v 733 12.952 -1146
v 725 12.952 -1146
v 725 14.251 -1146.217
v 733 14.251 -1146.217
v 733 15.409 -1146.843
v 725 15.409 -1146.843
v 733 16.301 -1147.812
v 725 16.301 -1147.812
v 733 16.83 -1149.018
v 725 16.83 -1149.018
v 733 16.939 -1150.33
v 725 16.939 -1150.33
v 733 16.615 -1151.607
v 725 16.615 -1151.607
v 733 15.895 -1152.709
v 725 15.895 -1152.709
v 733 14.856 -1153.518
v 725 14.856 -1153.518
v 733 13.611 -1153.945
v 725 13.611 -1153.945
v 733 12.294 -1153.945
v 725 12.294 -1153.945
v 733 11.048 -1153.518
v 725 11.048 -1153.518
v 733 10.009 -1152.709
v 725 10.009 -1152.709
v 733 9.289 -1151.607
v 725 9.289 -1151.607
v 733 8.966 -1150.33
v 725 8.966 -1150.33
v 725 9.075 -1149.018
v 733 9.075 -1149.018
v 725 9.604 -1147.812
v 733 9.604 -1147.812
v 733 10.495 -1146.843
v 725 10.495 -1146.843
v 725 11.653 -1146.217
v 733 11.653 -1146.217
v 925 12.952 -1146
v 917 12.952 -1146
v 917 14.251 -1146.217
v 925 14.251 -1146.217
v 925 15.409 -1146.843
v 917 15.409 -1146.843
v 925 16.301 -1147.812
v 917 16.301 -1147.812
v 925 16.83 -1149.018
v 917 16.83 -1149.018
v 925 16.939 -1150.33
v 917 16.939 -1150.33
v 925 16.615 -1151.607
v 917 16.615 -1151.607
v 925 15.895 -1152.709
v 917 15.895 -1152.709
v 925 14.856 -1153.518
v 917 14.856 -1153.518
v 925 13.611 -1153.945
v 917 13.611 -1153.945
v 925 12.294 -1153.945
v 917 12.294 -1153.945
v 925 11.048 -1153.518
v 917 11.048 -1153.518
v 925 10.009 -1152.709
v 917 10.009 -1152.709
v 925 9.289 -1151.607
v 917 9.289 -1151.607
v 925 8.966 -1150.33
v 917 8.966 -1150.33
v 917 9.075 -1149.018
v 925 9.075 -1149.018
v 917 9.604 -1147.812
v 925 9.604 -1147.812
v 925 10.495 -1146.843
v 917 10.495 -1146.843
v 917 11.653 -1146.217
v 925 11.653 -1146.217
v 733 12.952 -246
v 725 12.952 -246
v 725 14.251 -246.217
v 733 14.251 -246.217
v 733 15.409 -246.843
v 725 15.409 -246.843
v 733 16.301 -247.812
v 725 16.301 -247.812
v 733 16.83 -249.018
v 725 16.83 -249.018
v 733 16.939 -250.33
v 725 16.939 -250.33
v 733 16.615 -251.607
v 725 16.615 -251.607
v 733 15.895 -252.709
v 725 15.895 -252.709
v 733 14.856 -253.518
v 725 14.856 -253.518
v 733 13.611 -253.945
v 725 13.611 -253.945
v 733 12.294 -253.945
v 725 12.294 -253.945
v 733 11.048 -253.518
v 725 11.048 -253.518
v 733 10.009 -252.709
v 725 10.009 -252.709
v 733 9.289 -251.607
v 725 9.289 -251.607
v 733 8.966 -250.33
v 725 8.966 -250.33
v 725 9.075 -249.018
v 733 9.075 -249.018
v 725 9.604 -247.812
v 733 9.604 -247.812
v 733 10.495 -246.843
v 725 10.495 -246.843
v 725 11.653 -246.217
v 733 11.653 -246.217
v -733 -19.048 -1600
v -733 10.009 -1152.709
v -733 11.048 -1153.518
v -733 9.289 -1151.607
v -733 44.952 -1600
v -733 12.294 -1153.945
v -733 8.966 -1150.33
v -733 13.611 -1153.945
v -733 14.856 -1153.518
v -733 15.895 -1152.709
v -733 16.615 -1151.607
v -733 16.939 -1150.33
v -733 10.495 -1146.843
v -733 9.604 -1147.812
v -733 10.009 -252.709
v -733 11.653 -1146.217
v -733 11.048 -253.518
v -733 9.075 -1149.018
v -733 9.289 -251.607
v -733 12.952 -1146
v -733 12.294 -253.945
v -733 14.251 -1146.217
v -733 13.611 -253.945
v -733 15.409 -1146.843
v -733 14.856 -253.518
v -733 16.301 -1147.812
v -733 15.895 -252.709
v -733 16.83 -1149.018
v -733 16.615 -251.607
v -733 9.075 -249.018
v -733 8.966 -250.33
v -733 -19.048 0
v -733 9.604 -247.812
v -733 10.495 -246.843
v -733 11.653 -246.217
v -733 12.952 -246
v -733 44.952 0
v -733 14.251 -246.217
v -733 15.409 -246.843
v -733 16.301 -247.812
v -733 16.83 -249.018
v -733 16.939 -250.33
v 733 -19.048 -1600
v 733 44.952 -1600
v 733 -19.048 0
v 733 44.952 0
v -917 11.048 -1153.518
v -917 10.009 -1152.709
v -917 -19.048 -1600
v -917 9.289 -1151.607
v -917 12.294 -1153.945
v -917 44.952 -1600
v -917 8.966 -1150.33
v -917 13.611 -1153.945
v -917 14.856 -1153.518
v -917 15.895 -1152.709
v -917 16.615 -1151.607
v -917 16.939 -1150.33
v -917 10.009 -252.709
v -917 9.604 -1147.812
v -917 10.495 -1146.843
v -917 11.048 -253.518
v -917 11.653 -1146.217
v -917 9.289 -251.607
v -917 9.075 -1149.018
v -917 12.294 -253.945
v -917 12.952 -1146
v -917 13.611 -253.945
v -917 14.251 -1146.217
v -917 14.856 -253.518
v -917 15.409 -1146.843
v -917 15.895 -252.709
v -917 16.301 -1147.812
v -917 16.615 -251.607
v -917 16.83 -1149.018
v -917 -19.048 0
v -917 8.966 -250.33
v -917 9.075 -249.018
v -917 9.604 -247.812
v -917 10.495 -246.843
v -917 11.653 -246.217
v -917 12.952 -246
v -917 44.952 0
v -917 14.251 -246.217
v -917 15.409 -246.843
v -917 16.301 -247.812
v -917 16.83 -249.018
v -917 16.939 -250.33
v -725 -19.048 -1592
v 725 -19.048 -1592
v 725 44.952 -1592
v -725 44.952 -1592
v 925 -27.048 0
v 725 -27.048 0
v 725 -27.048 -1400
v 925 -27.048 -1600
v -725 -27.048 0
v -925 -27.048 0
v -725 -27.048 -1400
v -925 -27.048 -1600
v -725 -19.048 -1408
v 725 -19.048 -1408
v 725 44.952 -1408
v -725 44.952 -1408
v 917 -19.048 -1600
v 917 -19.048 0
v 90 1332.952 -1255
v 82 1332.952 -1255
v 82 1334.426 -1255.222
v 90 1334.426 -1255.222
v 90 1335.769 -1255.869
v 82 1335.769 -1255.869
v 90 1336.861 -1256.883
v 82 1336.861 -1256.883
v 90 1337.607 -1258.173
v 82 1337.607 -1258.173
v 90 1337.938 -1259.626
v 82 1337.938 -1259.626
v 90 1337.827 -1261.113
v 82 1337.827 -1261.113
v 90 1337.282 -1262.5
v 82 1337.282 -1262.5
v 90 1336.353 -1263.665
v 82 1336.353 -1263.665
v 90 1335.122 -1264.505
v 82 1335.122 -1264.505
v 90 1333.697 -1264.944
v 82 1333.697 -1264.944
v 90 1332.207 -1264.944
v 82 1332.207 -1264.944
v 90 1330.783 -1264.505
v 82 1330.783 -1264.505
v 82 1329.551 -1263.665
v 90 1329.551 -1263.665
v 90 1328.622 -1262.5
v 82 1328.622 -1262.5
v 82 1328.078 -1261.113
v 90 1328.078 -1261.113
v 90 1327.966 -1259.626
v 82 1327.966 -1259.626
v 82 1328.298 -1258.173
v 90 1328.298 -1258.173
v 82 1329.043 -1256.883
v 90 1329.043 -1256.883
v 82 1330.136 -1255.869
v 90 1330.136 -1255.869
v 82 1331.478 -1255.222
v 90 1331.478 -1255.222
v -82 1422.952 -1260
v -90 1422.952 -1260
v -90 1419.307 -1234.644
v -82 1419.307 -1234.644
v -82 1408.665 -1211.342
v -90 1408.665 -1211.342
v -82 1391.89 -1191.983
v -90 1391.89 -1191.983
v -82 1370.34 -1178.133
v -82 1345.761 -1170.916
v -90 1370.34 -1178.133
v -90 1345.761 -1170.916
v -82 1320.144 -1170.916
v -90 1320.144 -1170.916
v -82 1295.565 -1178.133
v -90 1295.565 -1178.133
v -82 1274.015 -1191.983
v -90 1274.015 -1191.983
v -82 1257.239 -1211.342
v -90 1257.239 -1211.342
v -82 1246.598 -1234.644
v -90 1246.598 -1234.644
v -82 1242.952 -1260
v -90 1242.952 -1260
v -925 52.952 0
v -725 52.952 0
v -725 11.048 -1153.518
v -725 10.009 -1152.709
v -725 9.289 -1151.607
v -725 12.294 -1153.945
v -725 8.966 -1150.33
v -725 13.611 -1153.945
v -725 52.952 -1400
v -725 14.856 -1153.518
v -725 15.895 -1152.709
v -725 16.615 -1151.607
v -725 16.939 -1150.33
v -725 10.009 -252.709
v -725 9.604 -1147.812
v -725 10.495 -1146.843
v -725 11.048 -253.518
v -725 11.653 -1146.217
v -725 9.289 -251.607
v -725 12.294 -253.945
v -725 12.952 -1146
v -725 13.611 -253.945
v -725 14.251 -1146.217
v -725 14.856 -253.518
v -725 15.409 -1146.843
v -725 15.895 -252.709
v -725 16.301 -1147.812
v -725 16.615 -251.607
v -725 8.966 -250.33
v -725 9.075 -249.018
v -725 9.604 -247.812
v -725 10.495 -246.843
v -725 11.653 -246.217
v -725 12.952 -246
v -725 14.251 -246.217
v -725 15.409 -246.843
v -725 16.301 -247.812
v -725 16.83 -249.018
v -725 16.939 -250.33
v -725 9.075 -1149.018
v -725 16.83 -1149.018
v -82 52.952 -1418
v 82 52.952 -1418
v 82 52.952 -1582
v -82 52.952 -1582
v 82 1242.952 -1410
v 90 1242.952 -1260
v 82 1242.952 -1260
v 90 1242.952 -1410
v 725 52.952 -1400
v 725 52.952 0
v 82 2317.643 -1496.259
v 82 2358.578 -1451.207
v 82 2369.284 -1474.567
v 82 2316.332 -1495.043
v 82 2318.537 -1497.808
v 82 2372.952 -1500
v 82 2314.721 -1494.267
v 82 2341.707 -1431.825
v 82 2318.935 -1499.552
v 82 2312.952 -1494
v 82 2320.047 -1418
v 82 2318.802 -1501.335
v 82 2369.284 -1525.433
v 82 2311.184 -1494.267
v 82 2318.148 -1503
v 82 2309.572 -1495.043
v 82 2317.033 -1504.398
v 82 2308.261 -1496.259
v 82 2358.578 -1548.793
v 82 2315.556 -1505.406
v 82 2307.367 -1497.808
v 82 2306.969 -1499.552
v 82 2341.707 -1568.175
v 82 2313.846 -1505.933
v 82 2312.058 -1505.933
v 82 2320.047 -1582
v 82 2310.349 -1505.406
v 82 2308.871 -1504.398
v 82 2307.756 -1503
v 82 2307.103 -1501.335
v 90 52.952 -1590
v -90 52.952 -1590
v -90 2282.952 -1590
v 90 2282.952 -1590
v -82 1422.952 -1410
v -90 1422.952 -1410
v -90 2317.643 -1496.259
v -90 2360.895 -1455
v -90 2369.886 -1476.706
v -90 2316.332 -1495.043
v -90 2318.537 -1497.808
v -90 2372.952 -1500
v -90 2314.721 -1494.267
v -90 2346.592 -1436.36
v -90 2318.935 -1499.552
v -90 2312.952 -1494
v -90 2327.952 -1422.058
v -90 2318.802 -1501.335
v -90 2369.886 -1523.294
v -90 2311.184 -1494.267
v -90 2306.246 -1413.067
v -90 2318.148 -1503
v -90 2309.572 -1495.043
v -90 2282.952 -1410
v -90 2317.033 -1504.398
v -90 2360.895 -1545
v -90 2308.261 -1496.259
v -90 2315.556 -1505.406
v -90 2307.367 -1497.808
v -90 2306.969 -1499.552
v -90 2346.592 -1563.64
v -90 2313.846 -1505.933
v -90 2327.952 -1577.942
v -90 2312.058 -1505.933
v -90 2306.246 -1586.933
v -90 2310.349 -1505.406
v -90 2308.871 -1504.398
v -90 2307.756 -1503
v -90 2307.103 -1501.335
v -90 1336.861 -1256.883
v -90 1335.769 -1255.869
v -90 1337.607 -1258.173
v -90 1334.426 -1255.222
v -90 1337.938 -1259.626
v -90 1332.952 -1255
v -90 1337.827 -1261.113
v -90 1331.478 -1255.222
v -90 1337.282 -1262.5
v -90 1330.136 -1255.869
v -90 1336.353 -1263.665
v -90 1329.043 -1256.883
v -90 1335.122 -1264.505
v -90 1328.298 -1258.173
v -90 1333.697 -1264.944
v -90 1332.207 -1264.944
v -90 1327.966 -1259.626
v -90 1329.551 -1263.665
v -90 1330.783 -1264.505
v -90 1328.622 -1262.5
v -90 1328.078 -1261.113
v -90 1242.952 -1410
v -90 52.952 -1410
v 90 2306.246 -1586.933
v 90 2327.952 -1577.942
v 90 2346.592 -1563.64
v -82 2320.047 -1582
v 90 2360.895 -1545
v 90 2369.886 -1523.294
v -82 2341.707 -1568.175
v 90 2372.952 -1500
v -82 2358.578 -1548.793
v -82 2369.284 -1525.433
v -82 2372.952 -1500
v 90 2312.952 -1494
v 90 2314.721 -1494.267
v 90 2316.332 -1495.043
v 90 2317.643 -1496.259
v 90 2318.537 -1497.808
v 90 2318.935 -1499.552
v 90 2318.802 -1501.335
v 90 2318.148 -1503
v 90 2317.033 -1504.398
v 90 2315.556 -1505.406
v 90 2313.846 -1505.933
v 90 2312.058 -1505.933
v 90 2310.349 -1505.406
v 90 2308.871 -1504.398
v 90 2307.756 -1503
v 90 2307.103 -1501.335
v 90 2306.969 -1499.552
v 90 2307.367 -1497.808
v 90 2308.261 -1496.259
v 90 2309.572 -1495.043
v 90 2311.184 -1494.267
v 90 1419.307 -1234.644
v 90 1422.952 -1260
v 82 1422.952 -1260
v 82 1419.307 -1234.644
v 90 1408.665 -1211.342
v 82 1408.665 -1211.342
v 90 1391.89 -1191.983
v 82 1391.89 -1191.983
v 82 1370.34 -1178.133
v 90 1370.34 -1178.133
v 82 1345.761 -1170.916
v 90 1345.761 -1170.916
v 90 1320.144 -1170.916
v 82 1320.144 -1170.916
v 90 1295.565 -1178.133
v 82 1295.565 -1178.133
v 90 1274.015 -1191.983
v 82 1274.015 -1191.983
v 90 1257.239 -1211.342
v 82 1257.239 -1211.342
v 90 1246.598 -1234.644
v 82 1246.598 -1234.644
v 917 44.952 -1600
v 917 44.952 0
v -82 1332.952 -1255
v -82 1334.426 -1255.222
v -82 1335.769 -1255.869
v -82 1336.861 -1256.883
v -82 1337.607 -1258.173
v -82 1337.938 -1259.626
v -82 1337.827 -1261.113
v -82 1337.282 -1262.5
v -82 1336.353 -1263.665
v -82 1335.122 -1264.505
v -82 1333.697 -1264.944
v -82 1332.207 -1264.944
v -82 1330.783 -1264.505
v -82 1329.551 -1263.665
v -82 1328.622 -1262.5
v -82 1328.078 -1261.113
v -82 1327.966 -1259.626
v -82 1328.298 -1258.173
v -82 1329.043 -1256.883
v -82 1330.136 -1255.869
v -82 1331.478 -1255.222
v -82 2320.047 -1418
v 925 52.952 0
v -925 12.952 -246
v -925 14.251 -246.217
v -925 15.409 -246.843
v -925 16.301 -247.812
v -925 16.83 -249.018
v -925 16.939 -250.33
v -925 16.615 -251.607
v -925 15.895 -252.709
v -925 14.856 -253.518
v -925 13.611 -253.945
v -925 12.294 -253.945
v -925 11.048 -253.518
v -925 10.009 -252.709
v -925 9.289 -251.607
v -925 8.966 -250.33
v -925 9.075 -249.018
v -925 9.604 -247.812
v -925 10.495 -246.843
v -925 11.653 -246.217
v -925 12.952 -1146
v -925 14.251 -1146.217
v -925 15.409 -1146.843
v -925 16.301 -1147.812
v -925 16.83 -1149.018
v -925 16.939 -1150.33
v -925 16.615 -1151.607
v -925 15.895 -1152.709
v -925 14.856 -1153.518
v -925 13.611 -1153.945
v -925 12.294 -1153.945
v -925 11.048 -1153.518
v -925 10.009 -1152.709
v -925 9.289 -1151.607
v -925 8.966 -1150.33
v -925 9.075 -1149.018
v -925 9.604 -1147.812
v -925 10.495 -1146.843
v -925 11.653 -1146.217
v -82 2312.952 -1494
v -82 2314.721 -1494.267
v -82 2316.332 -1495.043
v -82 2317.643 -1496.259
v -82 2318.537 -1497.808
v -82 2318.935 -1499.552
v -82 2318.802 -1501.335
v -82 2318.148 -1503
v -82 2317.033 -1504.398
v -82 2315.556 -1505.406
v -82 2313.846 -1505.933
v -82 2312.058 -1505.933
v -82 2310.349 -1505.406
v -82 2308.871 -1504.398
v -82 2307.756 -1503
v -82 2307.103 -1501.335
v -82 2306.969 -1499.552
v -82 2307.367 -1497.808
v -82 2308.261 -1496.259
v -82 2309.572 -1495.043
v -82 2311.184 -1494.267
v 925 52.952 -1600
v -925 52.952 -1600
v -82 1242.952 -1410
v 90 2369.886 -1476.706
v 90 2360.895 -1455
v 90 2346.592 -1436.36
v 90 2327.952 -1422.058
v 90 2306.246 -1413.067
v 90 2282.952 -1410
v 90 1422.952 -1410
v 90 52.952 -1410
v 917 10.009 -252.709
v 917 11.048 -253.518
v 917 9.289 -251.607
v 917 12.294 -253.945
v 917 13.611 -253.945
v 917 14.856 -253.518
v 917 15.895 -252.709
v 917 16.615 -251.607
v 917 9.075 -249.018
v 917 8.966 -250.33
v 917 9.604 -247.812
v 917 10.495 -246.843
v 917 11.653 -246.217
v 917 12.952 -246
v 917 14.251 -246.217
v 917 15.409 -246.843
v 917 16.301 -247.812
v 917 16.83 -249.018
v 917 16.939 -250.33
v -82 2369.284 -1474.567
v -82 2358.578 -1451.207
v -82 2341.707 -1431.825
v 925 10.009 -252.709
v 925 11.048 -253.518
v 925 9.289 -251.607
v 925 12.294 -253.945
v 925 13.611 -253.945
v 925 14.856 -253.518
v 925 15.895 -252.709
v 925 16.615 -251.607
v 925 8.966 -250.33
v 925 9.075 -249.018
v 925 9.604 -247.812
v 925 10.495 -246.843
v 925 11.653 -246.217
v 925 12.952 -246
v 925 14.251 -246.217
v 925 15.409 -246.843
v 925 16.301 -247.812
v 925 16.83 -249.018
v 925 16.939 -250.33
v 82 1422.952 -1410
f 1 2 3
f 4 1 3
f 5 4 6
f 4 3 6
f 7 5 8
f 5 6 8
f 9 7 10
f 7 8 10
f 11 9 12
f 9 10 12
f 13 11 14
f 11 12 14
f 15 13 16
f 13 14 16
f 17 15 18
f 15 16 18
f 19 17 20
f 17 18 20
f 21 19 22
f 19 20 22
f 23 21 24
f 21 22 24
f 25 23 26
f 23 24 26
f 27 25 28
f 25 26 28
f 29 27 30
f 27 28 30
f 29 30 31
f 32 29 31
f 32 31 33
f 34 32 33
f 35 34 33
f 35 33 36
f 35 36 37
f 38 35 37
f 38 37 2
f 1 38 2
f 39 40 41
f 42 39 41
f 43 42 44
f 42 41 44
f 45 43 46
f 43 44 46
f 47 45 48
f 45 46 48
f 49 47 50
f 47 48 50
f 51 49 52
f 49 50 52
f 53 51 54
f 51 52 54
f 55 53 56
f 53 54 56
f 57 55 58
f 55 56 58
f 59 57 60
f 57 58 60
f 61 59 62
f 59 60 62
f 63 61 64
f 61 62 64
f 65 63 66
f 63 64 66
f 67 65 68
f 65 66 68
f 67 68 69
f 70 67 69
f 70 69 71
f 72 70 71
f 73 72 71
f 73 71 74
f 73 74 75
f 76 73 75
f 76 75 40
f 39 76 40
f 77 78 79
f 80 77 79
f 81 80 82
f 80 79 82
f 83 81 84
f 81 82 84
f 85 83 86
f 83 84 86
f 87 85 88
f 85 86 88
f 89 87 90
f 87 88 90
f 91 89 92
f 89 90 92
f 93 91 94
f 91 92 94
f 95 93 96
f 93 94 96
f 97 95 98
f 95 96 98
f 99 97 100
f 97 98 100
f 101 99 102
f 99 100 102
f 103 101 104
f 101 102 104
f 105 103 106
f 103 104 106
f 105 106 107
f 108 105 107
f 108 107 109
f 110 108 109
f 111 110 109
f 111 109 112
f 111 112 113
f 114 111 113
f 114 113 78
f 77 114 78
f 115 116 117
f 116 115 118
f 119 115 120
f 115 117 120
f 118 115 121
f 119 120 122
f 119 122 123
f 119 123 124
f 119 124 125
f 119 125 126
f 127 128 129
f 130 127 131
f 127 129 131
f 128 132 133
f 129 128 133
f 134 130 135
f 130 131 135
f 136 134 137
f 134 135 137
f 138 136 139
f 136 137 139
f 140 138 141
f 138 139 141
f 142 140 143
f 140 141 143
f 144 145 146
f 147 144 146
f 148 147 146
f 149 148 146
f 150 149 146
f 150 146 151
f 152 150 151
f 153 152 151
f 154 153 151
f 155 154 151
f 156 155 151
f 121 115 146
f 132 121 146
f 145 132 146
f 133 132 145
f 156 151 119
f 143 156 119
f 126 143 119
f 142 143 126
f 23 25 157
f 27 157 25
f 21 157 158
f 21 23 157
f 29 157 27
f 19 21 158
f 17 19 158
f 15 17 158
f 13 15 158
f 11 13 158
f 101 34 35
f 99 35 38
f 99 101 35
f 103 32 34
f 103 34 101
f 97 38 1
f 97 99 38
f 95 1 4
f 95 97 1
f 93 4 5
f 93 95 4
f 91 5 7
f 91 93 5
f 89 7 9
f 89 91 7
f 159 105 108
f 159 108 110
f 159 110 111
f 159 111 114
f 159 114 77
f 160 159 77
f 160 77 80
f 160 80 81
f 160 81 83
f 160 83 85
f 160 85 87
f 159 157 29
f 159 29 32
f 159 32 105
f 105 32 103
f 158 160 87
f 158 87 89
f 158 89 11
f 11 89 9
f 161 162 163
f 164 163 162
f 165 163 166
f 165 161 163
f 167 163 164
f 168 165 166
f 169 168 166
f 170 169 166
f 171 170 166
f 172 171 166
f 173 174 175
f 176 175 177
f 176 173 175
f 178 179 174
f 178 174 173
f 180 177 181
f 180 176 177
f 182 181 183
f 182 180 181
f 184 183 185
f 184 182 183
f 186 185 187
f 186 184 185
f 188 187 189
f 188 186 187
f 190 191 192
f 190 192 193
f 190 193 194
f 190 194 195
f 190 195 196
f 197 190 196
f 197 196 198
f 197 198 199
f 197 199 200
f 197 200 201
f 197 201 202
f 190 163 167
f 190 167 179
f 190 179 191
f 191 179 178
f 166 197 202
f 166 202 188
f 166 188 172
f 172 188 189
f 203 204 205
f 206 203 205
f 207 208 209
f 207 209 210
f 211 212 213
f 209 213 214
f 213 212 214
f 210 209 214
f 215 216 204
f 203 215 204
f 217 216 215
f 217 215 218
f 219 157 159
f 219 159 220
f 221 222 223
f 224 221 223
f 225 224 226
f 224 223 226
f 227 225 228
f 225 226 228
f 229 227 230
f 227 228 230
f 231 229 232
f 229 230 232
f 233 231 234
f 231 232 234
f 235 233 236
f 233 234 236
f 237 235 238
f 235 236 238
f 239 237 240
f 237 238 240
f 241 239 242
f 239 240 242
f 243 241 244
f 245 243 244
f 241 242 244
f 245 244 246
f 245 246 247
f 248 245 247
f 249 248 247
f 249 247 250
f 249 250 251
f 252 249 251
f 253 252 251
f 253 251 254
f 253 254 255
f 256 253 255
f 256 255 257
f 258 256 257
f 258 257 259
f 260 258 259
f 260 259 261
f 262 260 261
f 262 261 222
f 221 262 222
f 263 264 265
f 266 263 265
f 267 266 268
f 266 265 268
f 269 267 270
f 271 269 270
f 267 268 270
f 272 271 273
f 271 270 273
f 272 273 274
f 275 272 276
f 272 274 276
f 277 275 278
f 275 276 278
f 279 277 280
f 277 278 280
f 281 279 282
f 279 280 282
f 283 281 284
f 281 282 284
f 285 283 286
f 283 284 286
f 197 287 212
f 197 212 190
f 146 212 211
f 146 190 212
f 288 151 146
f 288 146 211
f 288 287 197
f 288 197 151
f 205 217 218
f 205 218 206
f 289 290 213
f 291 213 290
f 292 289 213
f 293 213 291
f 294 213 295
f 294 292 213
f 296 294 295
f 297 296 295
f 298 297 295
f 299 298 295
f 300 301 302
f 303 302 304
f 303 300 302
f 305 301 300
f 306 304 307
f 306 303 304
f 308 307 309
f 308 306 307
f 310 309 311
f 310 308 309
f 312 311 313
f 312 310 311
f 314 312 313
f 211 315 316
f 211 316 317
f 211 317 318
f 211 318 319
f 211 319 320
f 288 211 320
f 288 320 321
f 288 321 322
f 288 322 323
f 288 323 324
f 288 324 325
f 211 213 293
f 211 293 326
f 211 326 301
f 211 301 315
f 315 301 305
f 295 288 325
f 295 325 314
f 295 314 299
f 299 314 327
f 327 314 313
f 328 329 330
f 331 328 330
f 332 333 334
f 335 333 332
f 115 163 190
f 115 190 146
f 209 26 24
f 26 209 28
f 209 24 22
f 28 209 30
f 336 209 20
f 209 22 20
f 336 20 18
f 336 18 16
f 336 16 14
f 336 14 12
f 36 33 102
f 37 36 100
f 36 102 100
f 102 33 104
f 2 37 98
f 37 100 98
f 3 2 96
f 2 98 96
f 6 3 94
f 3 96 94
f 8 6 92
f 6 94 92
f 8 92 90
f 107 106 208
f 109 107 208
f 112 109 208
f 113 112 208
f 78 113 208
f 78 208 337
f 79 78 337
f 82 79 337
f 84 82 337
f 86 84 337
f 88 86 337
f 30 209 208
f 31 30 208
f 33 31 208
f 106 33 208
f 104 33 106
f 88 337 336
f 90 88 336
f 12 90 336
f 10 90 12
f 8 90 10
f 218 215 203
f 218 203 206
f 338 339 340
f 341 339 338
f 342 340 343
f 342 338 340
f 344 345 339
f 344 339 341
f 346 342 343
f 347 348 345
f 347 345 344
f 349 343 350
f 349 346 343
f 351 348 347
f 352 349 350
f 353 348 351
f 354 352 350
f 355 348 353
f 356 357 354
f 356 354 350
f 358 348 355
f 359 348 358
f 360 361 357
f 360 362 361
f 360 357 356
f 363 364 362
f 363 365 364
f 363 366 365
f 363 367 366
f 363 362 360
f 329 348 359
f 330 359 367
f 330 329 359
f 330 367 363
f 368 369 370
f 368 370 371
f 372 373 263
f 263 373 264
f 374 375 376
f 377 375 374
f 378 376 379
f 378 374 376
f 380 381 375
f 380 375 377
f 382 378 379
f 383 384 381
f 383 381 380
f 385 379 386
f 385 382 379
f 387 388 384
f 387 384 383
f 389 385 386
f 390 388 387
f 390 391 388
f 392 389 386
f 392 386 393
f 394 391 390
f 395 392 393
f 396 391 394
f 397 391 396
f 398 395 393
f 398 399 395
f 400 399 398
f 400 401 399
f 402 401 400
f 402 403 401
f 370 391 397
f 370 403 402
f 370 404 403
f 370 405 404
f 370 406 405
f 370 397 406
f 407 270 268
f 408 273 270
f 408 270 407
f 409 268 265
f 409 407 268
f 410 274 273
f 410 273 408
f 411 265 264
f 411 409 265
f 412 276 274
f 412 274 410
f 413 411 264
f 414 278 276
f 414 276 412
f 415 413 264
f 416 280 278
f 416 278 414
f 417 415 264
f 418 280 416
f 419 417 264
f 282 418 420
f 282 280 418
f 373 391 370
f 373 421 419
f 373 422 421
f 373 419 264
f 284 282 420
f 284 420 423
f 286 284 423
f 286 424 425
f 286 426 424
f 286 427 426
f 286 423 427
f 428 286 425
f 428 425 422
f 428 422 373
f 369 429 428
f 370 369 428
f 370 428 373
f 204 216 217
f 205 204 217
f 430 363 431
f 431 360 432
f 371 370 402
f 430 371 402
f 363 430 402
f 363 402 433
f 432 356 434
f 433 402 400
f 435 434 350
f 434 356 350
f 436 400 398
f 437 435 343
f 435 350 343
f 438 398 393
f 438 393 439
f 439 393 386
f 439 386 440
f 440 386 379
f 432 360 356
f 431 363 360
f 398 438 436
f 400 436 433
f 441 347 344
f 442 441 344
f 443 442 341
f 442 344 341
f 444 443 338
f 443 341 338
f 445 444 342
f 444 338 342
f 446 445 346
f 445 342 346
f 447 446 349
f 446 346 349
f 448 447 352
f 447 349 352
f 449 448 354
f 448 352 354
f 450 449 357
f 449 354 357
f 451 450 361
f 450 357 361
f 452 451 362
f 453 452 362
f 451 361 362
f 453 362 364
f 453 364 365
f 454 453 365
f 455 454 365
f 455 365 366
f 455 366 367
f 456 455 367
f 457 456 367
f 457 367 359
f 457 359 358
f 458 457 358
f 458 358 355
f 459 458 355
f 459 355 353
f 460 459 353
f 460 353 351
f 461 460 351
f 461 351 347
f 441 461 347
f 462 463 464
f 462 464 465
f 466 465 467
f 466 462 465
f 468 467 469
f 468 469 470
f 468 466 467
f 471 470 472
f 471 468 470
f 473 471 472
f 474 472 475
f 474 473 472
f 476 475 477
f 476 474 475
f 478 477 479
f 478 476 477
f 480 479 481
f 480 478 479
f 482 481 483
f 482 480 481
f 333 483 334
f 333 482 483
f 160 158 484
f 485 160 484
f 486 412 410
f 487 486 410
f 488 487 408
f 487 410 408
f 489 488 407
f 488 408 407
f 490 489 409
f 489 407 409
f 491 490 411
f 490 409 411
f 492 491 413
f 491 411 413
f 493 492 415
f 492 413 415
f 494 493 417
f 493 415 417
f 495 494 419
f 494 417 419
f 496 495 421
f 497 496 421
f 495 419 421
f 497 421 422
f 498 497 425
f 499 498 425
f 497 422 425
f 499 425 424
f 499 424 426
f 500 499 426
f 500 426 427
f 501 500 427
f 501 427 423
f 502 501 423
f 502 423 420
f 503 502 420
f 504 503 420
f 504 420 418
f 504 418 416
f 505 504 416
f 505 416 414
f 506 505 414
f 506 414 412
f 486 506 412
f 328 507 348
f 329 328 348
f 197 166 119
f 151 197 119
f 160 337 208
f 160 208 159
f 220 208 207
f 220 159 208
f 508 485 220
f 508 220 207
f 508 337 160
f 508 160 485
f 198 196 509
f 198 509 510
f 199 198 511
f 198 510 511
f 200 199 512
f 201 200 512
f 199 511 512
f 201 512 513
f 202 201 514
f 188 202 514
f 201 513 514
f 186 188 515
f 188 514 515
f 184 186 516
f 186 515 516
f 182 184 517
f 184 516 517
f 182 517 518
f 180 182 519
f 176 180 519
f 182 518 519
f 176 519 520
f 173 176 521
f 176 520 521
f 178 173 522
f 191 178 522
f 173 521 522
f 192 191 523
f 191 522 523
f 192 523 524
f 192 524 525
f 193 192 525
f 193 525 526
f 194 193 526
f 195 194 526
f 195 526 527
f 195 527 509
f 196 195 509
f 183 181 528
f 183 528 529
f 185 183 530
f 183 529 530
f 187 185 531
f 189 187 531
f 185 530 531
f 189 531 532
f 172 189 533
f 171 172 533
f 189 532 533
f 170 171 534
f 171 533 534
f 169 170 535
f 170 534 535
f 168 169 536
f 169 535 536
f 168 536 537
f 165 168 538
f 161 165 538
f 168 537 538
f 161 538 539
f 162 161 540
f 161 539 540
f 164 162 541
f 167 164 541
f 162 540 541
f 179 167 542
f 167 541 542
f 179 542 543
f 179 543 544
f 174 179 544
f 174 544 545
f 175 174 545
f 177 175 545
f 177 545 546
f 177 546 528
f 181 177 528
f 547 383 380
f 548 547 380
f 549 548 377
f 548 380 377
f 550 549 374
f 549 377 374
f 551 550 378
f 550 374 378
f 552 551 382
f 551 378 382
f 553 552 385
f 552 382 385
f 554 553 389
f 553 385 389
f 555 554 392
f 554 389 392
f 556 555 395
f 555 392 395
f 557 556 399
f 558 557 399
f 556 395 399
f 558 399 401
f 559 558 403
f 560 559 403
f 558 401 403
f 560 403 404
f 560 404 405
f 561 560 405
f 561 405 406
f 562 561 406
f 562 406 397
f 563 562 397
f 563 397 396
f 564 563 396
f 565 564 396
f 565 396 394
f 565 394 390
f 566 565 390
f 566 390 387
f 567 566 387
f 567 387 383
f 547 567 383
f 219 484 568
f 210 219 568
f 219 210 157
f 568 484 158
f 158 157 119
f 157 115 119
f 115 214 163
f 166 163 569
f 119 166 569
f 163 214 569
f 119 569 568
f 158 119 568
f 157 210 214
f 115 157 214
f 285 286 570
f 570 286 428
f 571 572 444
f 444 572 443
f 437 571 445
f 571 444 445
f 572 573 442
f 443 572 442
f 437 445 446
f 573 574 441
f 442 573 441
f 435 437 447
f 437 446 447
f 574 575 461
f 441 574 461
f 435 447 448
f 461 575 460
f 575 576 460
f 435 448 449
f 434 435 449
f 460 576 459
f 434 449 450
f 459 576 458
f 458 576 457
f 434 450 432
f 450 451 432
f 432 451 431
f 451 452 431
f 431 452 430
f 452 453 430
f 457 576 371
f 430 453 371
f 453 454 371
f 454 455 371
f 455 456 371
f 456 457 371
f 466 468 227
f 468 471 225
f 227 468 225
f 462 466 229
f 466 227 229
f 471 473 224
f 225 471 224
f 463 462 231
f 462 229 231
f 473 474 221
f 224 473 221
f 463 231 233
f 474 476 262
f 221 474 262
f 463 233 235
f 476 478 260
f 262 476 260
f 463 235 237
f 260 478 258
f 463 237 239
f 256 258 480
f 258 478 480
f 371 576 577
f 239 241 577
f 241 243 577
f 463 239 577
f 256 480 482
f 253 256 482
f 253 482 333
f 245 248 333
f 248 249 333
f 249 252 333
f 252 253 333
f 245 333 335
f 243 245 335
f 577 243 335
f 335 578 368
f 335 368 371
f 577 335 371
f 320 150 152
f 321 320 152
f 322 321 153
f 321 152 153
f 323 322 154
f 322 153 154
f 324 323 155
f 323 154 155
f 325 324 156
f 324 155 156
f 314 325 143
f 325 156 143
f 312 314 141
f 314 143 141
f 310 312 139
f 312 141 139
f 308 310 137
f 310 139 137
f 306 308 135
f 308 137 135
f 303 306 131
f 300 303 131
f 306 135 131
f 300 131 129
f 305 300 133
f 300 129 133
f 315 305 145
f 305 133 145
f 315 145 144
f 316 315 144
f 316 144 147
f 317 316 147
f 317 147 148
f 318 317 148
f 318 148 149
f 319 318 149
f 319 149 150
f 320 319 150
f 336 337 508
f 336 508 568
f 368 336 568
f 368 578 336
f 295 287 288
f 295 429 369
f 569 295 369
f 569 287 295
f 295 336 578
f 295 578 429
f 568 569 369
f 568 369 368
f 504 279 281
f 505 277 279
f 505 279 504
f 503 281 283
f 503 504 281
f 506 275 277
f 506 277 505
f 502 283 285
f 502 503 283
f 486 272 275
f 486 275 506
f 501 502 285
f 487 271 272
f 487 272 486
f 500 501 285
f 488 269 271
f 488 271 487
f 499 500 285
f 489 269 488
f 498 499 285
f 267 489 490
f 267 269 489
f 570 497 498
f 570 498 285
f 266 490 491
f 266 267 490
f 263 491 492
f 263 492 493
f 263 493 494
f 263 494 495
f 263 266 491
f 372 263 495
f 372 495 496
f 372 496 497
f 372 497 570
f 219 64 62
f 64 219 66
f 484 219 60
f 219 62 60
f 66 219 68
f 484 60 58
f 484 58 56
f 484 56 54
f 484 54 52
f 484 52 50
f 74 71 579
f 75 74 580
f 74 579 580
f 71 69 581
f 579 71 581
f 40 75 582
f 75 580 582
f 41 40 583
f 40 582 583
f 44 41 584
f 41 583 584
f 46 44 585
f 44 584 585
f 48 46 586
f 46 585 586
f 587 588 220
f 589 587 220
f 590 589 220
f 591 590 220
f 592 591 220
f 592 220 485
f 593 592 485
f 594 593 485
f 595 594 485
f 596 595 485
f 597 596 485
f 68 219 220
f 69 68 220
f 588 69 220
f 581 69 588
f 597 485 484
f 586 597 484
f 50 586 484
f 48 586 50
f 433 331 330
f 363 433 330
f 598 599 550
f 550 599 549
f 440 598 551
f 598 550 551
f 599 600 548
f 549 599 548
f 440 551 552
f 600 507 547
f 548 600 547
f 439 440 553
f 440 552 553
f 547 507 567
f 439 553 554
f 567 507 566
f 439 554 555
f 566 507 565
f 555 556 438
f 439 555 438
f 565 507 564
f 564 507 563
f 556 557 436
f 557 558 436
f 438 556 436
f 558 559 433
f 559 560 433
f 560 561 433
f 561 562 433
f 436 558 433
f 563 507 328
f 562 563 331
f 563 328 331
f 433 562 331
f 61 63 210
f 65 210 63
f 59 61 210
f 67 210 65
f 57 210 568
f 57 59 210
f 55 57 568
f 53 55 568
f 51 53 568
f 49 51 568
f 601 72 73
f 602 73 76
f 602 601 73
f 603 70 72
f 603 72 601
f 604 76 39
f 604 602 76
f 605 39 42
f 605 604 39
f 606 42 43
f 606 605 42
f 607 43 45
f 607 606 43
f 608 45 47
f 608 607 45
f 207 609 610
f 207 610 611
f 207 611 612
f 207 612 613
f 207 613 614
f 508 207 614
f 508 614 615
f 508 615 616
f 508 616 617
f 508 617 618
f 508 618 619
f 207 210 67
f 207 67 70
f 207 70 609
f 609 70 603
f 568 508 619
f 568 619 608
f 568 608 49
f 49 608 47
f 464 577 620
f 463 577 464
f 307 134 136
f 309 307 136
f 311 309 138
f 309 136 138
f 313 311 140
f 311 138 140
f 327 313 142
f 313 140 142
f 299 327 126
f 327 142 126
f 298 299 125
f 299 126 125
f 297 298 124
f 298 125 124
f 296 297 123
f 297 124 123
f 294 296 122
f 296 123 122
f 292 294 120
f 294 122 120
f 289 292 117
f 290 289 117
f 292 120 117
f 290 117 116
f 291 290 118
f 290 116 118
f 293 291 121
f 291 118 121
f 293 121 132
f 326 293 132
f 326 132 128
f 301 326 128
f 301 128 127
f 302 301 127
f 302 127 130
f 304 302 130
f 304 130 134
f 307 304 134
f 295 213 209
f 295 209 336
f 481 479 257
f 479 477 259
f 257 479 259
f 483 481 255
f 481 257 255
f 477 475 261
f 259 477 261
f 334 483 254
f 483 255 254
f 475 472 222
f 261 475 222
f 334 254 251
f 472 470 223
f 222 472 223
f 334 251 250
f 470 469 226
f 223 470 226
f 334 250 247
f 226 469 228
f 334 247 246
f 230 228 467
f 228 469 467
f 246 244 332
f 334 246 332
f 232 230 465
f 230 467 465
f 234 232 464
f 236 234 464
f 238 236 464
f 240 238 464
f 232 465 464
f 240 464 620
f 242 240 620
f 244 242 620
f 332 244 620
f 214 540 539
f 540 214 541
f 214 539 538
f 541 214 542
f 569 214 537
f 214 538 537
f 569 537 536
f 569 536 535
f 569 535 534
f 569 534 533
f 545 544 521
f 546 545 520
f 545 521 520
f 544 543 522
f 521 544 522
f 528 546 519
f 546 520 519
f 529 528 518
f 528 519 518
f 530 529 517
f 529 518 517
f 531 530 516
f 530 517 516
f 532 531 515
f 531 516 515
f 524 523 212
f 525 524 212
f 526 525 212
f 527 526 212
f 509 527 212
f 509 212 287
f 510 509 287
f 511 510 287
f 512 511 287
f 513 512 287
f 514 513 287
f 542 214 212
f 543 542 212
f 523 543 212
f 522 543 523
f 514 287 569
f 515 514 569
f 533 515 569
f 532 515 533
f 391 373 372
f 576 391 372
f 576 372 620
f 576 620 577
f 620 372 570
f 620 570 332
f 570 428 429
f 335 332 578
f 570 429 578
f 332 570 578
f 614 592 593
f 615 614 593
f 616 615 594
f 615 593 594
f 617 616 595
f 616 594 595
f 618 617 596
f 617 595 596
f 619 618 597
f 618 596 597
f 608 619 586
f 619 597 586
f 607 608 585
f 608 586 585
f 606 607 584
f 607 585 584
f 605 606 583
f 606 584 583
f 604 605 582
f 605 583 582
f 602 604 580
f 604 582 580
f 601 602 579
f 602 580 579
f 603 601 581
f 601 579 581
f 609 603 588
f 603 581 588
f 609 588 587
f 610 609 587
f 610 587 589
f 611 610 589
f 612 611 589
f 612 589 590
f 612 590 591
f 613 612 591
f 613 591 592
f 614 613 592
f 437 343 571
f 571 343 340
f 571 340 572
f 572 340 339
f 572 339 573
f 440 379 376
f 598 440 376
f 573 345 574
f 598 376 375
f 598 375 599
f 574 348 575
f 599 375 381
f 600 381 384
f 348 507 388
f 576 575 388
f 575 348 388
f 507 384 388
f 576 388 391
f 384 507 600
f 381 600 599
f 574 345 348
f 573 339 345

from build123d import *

# Parameters (mm, degrees)
IZIM1_W                       = 200
IZIM1_H                       = 80
IZIM1_W_2                     = 184
IZIM1_H_2                     = 64
Y_KSEKLIK_EKSTR_ZYON1_DEPTH   = 1600
Y_KSEKLIK_EKSTR_ZYON1_2_DEPTH = 1600
IZIM2_W                       = 200
IZIM2_H                       = 80
IZIM2_W_2                     = 184
IZIM2_H_2                     = 64
Y_KSEKLIK_EKSTR_ZYON2_DEPTH   = 1450
IZIM3_W                       = 180
IZIM3_H                       = 180
IZIM3_W_2                     = 164
IZIM3_H_2                     = 164
Y_KSEKLIK_EKSTR_ZYON3_DEPTH   = 2320
KES_EKSTR_ZYON1_DEPTH         = 180
IZIM4_3_R                     = 6
KES_EKSTR_ZYON2_DEPTH         = 180
IZIM5_R                       = 4
KES_EKSTR_ZYON3_DEPTH         = 1850
Y_KSEKLIK_EKSTR_ZYON4_DEPTH   = 8
Y_KSEKLIK_EKSTR_ZYON5_DEPTH   = 8
IZIM8_R                       = 5
KES_EKSTR_ZYON4_DEPTH         = 284


with BuildPart() as part:
    # Çizim1 → Yükseklik-Ekstrüzyon1 (new body)
    with BuildSketch(Plane.XY):
        with Locations((-825, 12.952230465)):
            Rectangle(IZIM1_W, IZIM1_H)
        with Locations((-825, 12.952230465)):
            Rectangle(IZIM1_W_2, IZIM1_H_2, mode=Mode.SUBTRACT)
    extrude(amount=-Y_KSEKLIK_EKSTR_ZYON1_DEPTH)



with BuildPart() as body_2:
    # Çizim1 → Y_kseklik-Ekstr_zyon1 2 (new body)
    with BuildSketch(Plane.XY):
        with Locations((825, 12.952230465)):
            Rectangle(IZIM1_W, IZIM1_H)
        with Locations((825, 12.952230465)):
            Rectangle(IZIM1_W_2, IZIM1_H_2, mode=Mode.SUBTRACT)
    extrude(amount=-Y_KSEKLIK_EKSTR_ZYON1_2_DEPTH)


with BuildPart() as part_1:
    add(part.part)

    add(body_2.part)  # Yükseklik-Ekstrüzyon2 merges body 2
    # Çizim2 → Yükseklik-Ekstrüzyon2 (add)
    with BuildSketch(Plane(origin=(-725, 0, 0), x_dir=(0, 0, -1), z_dir=(1, 0, 0))):
        with Locations((1500, 12.952230465)):
            Rectangle(IZIM2_W, IZIM2_H)
        with Locations((1500, 12.952230465)):
            Rectangle(IZIM2_W_2, IZIM2_H_2, mode=Mode.SUBTRACT)
    extrude(amount=Y_KSEKLIK_EKSTR_ZYON2_DEPTH)

    # Çizim3 → Yükseklik-Ekstrüzyon3 (add)
    with BuildSketch(Plane(origin=(0, 52.952230465, 0), x_dir=(1, 0, 0), z_dir=(0, 1, 0))):
        with Locations((0, 1500)):
            Rectangle(IZIM3_W, IZIM3_H)
        with Locations((0, 1500)):
            Rectangle(IZIM3_W_2, IZIM3_H_2, mode=Mode.SUBTRACT)
    extrude(amount=Y_KSEKLIK_EKSTR_ZYON3_DEPTH)

    # Çizim4 → Kes-Ekstrüzyon1 (cut)
    with BuildSketch(Plane.ZY.offset(90)):
        with BuildLine():
            Line((-1590, 2372.952230465), (-1590, 2282.952230465))
            ThreePointArc((-1590, 2282.952230465), (-1563.639610307, 2346.591840772), (-1500, 2372.952230465))
            Line((-1500, 2372.952230465), (-1590, 2372.952230465))
        make_face()
        with BuildLine():
            ThreePointArc((-1500, 2372.952230465), (-1436.360389693, 2346.591840772), (-1410, 2282.952230465))
            Line((-1410, 2282.952230465), (-1410, 2372.952230465))
            Line((-1410, 2372.952230465), (-1500, 2372.952230465))
        make_face()
    extrude(amount=-KES_EKSTR_ZYON1_DEPTH, mode=Mode.SUBTRACT)

    # Çizim4<3> → Kes-Ekstrüzyon2 (cut)
    with BuildSketch(Plane.ZY.offset(90)):
        with Locations((-1500, 2312.952230465)):
            Circle(IZIM4_3_R)
    extrude(amount=-KES_EKSTR_ZYON2_DEPTH, mode=Mode.SUBTRACT)

    # Çizim5 → Kes-Ekstrüzyon3 (cut)
    with BuildSketch(Plane.ZY.offset(925)):
        with Locations((-250, 12.952230465)):
            Circle(IZIM5_R)
        with Locations((-1150, 12.952230465)):
            Circle(IZIM5_R)
    extrude(amount=-KES_EKSTR_ZYON3_DEPTH, mode=Mode.SUBTRACT)

    # Çizim6 → Yükseklik-Ekstrüzyon4 (add)
    with BuildSketch(Plane.ZY.offset(90)):
        with BuildLine():
            Line((-1410, 1422.952230465), (-1260, 1422.952230465))
            ThreePointArc((-1260, 1422.952230465), (-1170, 1332.952230465), (-1260, 1242.952230465))
            Line((-1260, 1242.952230465), (-1410, 1242.952230465))
            Line((-1410, 1242.952230465), (-1410, 1422.952230465))
        make_face()
    extrude(amount=-Y_KSEKLIK_EKSTR_ZYON4_DEPTH)

    # Çizim7 → Yükseklik-Ekstrüzyon5 (add)
    with BuildSketch(Plane(origin=(90, 0, 0), x_dir=(0, 0, -1), z_dir=(1, 0, 0))):
        with BuildLine():
            Line((1410, 1422.952230465), (1260, 1422.952230465))
            ThreePointArc((1260, 1422.952230465), (1170, 1332.952230465), (1260, 1242.952230465))
            Line((1260, 1242.952230465), (1410, 1242.952230465))
            Line((1410, 1242.952230465), (1410, 1422.952230465))
        make_face()
    extrude(amount=-Y_KSEKLIK_EKSTR_ZYON5_DEPTH)

    # Çizim8 → Kes-Ekstrüzyon4 (cut)
    with BuildSketch(Plane.ZY.offset(90)):
        with Locations((-1260, 1332.952230465)):
            Circle(IZIM8_R)
    extrude(amount=-KES_EKSTR_ZYON4_DEPTH, mode=Mode.SUBTRACT)


solid = part_1.part
